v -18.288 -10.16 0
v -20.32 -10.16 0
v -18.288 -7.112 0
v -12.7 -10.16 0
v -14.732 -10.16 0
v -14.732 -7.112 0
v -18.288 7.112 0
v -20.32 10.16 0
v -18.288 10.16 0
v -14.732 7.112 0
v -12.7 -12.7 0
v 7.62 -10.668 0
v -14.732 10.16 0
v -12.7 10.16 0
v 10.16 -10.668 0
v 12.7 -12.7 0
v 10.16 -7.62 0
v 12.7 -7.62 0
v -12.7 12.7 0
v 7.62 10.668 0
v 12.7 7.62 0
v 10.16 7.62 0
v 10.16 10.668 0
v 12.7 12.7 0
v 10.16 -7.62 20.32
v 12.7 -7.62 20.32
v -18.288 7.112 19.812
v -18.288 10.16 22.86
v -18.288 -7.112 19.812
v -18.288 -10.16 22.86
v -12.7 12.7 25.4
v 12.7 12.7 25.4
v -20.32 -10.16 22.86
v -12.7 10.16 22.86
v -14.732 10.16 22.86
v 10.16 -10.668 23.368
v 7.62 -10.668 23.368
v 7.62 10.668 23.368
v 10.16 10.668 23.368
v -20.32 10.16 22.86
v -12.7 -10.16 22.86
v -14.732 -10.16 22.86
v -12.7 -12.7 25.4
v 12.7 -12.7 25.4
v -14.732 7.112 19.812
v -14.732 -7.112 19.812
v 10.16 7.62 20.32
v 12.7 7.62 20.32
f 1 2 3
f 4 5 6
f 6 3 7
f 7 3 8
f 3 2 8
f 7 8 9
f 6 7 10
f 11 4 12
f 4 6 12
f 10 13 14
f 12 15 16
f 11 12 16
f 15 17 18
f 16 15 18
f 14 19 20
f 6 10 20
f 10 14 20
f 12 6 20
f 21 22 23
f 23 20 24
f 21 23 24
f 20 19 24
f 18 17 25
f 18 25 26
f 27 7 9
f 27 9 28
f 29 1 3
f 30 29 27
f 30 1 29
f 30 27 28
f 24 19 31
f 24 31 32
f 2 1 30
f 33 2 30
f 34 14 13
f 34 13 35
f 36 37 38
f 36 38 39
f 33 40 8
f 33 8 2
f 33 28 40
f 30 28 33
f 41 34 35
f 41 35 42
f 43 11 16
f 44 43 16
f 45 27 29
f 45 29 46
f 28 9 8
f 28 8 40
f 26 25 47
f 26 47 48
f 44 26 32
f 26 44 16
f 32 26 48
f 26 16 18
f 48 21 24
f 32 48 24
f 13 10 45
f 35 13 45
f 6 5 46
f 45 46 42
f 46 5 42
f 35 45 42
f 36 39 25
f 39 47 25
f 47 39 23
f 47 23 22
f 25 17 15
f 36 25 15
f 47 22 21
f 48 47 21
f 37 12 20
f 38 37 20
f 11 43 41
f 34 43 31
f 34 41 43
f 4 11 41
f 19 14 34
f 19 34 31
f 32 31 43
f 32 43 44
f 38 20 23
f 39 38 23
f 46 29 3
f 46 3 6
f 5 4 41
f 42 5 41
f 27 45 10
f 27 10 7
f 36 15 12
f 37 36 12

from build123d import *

# Parameters (mm, degrees)
F0_W      = 25.4
F0_H      = 25.4
F1_DEPTH  = 25.4
F2_W      = 20.32
F2_H      = 22.86
F3_DEPTH  = 7.62
F4_W      = 3.556
F4_H      = 20.32
F5_DEPTH  = 3.048
F6_W      = 3.556
F6_H      = 19.812
F7_DEPTH  = 3.048
F8_W      = 3.556
F8_H      = 19.812
F9_DEPTH  = 3.048
F13_DEPTH = 23.368
F12_W     = 2.54
F12_H     = 15.24
F14_DEPTH = 20.32


with BuildPart() as f1:
    # F0 (on Top) → F1 (new body)
    with BuildSketch(Plane.XY):
        Rectangle(F0_W, F0_H)
    extrude(amount=F1_DEPTH)

    # F2 (on face) → F3 (join)
    with BuildSketch(Plane(origin=(-12.7, 0, 0), x_dir=(0, -1, 0), z_dir=(-1, 0, 0))):
        with Locations((0, 11.43)):
            Rectangle(F2_W, F2_H)
    extrude(amount=F3_DEPTH)

    # F4 (on face) → F5 (cut)
    with BuildSketch(Plane.XY.offset(22.86)):
        with Locations((-16.51, 0)):
            Rectangle(F4_W, F4_H)
    extrude(amount=-F5_DEPTH, mode=Mode.SUBTRACT)

    # F6 (on face) → F7 (cut)
    with BuildSketch(Plane.XZ.offset(10.16)):
        with Locations((-16.51, 9.906)):
            Rectangle(F6_W, F6_H)
    extrude(amount=-F7_DEPTH, mode=Mode.SUBTRACT)

    # F8 (on face) → F9 (cut)
    with BuildSketch(Plane(origin=(0, 10.16, 0), x_dir=(-1, 0, 0), z_dir=(0, 1, 0))):
        with Locations((16.51, 9.906)):
            Rectangle(F8_W, F8_H)
    extrude(amount=-F9_DEPTH, mode=Mode.SUBTRACT)

    # F12 (on face) → F13 (cut)
    with BuildSketch(Plane(origin=(0, 0, 0), x_dir=(1, 0, 0), z_dir=(0, 0, -1))):
        Polygon((10.16, -7.62), (10.16, 7.62), (10.16, 10.668), (7.62, 10.668), (7.62, -10.668), (10.16, -10.668), align=None)
    extrude(amount=-F13_DEPTH, mode=Mode.SUBTRACT)

    # F12 (on face) → F14 (cut)
    with BuildSketch(Plane(origin=(0, 0, 0), x_dir=(1, 0, 0), z_dir=(0, 0, -1))):
        with Locations((11.43, 0)):
            Rectangle(F12_W, F12_H)
    extrude(amount=-F14_DEPTH, mode=Mode.SUBTRACT)


with BuildPart() as f10_1:
    # F10: copy of F1
    add(f1.part.moved(Location((-54.102, 0, 0))))


solid = f1.part
